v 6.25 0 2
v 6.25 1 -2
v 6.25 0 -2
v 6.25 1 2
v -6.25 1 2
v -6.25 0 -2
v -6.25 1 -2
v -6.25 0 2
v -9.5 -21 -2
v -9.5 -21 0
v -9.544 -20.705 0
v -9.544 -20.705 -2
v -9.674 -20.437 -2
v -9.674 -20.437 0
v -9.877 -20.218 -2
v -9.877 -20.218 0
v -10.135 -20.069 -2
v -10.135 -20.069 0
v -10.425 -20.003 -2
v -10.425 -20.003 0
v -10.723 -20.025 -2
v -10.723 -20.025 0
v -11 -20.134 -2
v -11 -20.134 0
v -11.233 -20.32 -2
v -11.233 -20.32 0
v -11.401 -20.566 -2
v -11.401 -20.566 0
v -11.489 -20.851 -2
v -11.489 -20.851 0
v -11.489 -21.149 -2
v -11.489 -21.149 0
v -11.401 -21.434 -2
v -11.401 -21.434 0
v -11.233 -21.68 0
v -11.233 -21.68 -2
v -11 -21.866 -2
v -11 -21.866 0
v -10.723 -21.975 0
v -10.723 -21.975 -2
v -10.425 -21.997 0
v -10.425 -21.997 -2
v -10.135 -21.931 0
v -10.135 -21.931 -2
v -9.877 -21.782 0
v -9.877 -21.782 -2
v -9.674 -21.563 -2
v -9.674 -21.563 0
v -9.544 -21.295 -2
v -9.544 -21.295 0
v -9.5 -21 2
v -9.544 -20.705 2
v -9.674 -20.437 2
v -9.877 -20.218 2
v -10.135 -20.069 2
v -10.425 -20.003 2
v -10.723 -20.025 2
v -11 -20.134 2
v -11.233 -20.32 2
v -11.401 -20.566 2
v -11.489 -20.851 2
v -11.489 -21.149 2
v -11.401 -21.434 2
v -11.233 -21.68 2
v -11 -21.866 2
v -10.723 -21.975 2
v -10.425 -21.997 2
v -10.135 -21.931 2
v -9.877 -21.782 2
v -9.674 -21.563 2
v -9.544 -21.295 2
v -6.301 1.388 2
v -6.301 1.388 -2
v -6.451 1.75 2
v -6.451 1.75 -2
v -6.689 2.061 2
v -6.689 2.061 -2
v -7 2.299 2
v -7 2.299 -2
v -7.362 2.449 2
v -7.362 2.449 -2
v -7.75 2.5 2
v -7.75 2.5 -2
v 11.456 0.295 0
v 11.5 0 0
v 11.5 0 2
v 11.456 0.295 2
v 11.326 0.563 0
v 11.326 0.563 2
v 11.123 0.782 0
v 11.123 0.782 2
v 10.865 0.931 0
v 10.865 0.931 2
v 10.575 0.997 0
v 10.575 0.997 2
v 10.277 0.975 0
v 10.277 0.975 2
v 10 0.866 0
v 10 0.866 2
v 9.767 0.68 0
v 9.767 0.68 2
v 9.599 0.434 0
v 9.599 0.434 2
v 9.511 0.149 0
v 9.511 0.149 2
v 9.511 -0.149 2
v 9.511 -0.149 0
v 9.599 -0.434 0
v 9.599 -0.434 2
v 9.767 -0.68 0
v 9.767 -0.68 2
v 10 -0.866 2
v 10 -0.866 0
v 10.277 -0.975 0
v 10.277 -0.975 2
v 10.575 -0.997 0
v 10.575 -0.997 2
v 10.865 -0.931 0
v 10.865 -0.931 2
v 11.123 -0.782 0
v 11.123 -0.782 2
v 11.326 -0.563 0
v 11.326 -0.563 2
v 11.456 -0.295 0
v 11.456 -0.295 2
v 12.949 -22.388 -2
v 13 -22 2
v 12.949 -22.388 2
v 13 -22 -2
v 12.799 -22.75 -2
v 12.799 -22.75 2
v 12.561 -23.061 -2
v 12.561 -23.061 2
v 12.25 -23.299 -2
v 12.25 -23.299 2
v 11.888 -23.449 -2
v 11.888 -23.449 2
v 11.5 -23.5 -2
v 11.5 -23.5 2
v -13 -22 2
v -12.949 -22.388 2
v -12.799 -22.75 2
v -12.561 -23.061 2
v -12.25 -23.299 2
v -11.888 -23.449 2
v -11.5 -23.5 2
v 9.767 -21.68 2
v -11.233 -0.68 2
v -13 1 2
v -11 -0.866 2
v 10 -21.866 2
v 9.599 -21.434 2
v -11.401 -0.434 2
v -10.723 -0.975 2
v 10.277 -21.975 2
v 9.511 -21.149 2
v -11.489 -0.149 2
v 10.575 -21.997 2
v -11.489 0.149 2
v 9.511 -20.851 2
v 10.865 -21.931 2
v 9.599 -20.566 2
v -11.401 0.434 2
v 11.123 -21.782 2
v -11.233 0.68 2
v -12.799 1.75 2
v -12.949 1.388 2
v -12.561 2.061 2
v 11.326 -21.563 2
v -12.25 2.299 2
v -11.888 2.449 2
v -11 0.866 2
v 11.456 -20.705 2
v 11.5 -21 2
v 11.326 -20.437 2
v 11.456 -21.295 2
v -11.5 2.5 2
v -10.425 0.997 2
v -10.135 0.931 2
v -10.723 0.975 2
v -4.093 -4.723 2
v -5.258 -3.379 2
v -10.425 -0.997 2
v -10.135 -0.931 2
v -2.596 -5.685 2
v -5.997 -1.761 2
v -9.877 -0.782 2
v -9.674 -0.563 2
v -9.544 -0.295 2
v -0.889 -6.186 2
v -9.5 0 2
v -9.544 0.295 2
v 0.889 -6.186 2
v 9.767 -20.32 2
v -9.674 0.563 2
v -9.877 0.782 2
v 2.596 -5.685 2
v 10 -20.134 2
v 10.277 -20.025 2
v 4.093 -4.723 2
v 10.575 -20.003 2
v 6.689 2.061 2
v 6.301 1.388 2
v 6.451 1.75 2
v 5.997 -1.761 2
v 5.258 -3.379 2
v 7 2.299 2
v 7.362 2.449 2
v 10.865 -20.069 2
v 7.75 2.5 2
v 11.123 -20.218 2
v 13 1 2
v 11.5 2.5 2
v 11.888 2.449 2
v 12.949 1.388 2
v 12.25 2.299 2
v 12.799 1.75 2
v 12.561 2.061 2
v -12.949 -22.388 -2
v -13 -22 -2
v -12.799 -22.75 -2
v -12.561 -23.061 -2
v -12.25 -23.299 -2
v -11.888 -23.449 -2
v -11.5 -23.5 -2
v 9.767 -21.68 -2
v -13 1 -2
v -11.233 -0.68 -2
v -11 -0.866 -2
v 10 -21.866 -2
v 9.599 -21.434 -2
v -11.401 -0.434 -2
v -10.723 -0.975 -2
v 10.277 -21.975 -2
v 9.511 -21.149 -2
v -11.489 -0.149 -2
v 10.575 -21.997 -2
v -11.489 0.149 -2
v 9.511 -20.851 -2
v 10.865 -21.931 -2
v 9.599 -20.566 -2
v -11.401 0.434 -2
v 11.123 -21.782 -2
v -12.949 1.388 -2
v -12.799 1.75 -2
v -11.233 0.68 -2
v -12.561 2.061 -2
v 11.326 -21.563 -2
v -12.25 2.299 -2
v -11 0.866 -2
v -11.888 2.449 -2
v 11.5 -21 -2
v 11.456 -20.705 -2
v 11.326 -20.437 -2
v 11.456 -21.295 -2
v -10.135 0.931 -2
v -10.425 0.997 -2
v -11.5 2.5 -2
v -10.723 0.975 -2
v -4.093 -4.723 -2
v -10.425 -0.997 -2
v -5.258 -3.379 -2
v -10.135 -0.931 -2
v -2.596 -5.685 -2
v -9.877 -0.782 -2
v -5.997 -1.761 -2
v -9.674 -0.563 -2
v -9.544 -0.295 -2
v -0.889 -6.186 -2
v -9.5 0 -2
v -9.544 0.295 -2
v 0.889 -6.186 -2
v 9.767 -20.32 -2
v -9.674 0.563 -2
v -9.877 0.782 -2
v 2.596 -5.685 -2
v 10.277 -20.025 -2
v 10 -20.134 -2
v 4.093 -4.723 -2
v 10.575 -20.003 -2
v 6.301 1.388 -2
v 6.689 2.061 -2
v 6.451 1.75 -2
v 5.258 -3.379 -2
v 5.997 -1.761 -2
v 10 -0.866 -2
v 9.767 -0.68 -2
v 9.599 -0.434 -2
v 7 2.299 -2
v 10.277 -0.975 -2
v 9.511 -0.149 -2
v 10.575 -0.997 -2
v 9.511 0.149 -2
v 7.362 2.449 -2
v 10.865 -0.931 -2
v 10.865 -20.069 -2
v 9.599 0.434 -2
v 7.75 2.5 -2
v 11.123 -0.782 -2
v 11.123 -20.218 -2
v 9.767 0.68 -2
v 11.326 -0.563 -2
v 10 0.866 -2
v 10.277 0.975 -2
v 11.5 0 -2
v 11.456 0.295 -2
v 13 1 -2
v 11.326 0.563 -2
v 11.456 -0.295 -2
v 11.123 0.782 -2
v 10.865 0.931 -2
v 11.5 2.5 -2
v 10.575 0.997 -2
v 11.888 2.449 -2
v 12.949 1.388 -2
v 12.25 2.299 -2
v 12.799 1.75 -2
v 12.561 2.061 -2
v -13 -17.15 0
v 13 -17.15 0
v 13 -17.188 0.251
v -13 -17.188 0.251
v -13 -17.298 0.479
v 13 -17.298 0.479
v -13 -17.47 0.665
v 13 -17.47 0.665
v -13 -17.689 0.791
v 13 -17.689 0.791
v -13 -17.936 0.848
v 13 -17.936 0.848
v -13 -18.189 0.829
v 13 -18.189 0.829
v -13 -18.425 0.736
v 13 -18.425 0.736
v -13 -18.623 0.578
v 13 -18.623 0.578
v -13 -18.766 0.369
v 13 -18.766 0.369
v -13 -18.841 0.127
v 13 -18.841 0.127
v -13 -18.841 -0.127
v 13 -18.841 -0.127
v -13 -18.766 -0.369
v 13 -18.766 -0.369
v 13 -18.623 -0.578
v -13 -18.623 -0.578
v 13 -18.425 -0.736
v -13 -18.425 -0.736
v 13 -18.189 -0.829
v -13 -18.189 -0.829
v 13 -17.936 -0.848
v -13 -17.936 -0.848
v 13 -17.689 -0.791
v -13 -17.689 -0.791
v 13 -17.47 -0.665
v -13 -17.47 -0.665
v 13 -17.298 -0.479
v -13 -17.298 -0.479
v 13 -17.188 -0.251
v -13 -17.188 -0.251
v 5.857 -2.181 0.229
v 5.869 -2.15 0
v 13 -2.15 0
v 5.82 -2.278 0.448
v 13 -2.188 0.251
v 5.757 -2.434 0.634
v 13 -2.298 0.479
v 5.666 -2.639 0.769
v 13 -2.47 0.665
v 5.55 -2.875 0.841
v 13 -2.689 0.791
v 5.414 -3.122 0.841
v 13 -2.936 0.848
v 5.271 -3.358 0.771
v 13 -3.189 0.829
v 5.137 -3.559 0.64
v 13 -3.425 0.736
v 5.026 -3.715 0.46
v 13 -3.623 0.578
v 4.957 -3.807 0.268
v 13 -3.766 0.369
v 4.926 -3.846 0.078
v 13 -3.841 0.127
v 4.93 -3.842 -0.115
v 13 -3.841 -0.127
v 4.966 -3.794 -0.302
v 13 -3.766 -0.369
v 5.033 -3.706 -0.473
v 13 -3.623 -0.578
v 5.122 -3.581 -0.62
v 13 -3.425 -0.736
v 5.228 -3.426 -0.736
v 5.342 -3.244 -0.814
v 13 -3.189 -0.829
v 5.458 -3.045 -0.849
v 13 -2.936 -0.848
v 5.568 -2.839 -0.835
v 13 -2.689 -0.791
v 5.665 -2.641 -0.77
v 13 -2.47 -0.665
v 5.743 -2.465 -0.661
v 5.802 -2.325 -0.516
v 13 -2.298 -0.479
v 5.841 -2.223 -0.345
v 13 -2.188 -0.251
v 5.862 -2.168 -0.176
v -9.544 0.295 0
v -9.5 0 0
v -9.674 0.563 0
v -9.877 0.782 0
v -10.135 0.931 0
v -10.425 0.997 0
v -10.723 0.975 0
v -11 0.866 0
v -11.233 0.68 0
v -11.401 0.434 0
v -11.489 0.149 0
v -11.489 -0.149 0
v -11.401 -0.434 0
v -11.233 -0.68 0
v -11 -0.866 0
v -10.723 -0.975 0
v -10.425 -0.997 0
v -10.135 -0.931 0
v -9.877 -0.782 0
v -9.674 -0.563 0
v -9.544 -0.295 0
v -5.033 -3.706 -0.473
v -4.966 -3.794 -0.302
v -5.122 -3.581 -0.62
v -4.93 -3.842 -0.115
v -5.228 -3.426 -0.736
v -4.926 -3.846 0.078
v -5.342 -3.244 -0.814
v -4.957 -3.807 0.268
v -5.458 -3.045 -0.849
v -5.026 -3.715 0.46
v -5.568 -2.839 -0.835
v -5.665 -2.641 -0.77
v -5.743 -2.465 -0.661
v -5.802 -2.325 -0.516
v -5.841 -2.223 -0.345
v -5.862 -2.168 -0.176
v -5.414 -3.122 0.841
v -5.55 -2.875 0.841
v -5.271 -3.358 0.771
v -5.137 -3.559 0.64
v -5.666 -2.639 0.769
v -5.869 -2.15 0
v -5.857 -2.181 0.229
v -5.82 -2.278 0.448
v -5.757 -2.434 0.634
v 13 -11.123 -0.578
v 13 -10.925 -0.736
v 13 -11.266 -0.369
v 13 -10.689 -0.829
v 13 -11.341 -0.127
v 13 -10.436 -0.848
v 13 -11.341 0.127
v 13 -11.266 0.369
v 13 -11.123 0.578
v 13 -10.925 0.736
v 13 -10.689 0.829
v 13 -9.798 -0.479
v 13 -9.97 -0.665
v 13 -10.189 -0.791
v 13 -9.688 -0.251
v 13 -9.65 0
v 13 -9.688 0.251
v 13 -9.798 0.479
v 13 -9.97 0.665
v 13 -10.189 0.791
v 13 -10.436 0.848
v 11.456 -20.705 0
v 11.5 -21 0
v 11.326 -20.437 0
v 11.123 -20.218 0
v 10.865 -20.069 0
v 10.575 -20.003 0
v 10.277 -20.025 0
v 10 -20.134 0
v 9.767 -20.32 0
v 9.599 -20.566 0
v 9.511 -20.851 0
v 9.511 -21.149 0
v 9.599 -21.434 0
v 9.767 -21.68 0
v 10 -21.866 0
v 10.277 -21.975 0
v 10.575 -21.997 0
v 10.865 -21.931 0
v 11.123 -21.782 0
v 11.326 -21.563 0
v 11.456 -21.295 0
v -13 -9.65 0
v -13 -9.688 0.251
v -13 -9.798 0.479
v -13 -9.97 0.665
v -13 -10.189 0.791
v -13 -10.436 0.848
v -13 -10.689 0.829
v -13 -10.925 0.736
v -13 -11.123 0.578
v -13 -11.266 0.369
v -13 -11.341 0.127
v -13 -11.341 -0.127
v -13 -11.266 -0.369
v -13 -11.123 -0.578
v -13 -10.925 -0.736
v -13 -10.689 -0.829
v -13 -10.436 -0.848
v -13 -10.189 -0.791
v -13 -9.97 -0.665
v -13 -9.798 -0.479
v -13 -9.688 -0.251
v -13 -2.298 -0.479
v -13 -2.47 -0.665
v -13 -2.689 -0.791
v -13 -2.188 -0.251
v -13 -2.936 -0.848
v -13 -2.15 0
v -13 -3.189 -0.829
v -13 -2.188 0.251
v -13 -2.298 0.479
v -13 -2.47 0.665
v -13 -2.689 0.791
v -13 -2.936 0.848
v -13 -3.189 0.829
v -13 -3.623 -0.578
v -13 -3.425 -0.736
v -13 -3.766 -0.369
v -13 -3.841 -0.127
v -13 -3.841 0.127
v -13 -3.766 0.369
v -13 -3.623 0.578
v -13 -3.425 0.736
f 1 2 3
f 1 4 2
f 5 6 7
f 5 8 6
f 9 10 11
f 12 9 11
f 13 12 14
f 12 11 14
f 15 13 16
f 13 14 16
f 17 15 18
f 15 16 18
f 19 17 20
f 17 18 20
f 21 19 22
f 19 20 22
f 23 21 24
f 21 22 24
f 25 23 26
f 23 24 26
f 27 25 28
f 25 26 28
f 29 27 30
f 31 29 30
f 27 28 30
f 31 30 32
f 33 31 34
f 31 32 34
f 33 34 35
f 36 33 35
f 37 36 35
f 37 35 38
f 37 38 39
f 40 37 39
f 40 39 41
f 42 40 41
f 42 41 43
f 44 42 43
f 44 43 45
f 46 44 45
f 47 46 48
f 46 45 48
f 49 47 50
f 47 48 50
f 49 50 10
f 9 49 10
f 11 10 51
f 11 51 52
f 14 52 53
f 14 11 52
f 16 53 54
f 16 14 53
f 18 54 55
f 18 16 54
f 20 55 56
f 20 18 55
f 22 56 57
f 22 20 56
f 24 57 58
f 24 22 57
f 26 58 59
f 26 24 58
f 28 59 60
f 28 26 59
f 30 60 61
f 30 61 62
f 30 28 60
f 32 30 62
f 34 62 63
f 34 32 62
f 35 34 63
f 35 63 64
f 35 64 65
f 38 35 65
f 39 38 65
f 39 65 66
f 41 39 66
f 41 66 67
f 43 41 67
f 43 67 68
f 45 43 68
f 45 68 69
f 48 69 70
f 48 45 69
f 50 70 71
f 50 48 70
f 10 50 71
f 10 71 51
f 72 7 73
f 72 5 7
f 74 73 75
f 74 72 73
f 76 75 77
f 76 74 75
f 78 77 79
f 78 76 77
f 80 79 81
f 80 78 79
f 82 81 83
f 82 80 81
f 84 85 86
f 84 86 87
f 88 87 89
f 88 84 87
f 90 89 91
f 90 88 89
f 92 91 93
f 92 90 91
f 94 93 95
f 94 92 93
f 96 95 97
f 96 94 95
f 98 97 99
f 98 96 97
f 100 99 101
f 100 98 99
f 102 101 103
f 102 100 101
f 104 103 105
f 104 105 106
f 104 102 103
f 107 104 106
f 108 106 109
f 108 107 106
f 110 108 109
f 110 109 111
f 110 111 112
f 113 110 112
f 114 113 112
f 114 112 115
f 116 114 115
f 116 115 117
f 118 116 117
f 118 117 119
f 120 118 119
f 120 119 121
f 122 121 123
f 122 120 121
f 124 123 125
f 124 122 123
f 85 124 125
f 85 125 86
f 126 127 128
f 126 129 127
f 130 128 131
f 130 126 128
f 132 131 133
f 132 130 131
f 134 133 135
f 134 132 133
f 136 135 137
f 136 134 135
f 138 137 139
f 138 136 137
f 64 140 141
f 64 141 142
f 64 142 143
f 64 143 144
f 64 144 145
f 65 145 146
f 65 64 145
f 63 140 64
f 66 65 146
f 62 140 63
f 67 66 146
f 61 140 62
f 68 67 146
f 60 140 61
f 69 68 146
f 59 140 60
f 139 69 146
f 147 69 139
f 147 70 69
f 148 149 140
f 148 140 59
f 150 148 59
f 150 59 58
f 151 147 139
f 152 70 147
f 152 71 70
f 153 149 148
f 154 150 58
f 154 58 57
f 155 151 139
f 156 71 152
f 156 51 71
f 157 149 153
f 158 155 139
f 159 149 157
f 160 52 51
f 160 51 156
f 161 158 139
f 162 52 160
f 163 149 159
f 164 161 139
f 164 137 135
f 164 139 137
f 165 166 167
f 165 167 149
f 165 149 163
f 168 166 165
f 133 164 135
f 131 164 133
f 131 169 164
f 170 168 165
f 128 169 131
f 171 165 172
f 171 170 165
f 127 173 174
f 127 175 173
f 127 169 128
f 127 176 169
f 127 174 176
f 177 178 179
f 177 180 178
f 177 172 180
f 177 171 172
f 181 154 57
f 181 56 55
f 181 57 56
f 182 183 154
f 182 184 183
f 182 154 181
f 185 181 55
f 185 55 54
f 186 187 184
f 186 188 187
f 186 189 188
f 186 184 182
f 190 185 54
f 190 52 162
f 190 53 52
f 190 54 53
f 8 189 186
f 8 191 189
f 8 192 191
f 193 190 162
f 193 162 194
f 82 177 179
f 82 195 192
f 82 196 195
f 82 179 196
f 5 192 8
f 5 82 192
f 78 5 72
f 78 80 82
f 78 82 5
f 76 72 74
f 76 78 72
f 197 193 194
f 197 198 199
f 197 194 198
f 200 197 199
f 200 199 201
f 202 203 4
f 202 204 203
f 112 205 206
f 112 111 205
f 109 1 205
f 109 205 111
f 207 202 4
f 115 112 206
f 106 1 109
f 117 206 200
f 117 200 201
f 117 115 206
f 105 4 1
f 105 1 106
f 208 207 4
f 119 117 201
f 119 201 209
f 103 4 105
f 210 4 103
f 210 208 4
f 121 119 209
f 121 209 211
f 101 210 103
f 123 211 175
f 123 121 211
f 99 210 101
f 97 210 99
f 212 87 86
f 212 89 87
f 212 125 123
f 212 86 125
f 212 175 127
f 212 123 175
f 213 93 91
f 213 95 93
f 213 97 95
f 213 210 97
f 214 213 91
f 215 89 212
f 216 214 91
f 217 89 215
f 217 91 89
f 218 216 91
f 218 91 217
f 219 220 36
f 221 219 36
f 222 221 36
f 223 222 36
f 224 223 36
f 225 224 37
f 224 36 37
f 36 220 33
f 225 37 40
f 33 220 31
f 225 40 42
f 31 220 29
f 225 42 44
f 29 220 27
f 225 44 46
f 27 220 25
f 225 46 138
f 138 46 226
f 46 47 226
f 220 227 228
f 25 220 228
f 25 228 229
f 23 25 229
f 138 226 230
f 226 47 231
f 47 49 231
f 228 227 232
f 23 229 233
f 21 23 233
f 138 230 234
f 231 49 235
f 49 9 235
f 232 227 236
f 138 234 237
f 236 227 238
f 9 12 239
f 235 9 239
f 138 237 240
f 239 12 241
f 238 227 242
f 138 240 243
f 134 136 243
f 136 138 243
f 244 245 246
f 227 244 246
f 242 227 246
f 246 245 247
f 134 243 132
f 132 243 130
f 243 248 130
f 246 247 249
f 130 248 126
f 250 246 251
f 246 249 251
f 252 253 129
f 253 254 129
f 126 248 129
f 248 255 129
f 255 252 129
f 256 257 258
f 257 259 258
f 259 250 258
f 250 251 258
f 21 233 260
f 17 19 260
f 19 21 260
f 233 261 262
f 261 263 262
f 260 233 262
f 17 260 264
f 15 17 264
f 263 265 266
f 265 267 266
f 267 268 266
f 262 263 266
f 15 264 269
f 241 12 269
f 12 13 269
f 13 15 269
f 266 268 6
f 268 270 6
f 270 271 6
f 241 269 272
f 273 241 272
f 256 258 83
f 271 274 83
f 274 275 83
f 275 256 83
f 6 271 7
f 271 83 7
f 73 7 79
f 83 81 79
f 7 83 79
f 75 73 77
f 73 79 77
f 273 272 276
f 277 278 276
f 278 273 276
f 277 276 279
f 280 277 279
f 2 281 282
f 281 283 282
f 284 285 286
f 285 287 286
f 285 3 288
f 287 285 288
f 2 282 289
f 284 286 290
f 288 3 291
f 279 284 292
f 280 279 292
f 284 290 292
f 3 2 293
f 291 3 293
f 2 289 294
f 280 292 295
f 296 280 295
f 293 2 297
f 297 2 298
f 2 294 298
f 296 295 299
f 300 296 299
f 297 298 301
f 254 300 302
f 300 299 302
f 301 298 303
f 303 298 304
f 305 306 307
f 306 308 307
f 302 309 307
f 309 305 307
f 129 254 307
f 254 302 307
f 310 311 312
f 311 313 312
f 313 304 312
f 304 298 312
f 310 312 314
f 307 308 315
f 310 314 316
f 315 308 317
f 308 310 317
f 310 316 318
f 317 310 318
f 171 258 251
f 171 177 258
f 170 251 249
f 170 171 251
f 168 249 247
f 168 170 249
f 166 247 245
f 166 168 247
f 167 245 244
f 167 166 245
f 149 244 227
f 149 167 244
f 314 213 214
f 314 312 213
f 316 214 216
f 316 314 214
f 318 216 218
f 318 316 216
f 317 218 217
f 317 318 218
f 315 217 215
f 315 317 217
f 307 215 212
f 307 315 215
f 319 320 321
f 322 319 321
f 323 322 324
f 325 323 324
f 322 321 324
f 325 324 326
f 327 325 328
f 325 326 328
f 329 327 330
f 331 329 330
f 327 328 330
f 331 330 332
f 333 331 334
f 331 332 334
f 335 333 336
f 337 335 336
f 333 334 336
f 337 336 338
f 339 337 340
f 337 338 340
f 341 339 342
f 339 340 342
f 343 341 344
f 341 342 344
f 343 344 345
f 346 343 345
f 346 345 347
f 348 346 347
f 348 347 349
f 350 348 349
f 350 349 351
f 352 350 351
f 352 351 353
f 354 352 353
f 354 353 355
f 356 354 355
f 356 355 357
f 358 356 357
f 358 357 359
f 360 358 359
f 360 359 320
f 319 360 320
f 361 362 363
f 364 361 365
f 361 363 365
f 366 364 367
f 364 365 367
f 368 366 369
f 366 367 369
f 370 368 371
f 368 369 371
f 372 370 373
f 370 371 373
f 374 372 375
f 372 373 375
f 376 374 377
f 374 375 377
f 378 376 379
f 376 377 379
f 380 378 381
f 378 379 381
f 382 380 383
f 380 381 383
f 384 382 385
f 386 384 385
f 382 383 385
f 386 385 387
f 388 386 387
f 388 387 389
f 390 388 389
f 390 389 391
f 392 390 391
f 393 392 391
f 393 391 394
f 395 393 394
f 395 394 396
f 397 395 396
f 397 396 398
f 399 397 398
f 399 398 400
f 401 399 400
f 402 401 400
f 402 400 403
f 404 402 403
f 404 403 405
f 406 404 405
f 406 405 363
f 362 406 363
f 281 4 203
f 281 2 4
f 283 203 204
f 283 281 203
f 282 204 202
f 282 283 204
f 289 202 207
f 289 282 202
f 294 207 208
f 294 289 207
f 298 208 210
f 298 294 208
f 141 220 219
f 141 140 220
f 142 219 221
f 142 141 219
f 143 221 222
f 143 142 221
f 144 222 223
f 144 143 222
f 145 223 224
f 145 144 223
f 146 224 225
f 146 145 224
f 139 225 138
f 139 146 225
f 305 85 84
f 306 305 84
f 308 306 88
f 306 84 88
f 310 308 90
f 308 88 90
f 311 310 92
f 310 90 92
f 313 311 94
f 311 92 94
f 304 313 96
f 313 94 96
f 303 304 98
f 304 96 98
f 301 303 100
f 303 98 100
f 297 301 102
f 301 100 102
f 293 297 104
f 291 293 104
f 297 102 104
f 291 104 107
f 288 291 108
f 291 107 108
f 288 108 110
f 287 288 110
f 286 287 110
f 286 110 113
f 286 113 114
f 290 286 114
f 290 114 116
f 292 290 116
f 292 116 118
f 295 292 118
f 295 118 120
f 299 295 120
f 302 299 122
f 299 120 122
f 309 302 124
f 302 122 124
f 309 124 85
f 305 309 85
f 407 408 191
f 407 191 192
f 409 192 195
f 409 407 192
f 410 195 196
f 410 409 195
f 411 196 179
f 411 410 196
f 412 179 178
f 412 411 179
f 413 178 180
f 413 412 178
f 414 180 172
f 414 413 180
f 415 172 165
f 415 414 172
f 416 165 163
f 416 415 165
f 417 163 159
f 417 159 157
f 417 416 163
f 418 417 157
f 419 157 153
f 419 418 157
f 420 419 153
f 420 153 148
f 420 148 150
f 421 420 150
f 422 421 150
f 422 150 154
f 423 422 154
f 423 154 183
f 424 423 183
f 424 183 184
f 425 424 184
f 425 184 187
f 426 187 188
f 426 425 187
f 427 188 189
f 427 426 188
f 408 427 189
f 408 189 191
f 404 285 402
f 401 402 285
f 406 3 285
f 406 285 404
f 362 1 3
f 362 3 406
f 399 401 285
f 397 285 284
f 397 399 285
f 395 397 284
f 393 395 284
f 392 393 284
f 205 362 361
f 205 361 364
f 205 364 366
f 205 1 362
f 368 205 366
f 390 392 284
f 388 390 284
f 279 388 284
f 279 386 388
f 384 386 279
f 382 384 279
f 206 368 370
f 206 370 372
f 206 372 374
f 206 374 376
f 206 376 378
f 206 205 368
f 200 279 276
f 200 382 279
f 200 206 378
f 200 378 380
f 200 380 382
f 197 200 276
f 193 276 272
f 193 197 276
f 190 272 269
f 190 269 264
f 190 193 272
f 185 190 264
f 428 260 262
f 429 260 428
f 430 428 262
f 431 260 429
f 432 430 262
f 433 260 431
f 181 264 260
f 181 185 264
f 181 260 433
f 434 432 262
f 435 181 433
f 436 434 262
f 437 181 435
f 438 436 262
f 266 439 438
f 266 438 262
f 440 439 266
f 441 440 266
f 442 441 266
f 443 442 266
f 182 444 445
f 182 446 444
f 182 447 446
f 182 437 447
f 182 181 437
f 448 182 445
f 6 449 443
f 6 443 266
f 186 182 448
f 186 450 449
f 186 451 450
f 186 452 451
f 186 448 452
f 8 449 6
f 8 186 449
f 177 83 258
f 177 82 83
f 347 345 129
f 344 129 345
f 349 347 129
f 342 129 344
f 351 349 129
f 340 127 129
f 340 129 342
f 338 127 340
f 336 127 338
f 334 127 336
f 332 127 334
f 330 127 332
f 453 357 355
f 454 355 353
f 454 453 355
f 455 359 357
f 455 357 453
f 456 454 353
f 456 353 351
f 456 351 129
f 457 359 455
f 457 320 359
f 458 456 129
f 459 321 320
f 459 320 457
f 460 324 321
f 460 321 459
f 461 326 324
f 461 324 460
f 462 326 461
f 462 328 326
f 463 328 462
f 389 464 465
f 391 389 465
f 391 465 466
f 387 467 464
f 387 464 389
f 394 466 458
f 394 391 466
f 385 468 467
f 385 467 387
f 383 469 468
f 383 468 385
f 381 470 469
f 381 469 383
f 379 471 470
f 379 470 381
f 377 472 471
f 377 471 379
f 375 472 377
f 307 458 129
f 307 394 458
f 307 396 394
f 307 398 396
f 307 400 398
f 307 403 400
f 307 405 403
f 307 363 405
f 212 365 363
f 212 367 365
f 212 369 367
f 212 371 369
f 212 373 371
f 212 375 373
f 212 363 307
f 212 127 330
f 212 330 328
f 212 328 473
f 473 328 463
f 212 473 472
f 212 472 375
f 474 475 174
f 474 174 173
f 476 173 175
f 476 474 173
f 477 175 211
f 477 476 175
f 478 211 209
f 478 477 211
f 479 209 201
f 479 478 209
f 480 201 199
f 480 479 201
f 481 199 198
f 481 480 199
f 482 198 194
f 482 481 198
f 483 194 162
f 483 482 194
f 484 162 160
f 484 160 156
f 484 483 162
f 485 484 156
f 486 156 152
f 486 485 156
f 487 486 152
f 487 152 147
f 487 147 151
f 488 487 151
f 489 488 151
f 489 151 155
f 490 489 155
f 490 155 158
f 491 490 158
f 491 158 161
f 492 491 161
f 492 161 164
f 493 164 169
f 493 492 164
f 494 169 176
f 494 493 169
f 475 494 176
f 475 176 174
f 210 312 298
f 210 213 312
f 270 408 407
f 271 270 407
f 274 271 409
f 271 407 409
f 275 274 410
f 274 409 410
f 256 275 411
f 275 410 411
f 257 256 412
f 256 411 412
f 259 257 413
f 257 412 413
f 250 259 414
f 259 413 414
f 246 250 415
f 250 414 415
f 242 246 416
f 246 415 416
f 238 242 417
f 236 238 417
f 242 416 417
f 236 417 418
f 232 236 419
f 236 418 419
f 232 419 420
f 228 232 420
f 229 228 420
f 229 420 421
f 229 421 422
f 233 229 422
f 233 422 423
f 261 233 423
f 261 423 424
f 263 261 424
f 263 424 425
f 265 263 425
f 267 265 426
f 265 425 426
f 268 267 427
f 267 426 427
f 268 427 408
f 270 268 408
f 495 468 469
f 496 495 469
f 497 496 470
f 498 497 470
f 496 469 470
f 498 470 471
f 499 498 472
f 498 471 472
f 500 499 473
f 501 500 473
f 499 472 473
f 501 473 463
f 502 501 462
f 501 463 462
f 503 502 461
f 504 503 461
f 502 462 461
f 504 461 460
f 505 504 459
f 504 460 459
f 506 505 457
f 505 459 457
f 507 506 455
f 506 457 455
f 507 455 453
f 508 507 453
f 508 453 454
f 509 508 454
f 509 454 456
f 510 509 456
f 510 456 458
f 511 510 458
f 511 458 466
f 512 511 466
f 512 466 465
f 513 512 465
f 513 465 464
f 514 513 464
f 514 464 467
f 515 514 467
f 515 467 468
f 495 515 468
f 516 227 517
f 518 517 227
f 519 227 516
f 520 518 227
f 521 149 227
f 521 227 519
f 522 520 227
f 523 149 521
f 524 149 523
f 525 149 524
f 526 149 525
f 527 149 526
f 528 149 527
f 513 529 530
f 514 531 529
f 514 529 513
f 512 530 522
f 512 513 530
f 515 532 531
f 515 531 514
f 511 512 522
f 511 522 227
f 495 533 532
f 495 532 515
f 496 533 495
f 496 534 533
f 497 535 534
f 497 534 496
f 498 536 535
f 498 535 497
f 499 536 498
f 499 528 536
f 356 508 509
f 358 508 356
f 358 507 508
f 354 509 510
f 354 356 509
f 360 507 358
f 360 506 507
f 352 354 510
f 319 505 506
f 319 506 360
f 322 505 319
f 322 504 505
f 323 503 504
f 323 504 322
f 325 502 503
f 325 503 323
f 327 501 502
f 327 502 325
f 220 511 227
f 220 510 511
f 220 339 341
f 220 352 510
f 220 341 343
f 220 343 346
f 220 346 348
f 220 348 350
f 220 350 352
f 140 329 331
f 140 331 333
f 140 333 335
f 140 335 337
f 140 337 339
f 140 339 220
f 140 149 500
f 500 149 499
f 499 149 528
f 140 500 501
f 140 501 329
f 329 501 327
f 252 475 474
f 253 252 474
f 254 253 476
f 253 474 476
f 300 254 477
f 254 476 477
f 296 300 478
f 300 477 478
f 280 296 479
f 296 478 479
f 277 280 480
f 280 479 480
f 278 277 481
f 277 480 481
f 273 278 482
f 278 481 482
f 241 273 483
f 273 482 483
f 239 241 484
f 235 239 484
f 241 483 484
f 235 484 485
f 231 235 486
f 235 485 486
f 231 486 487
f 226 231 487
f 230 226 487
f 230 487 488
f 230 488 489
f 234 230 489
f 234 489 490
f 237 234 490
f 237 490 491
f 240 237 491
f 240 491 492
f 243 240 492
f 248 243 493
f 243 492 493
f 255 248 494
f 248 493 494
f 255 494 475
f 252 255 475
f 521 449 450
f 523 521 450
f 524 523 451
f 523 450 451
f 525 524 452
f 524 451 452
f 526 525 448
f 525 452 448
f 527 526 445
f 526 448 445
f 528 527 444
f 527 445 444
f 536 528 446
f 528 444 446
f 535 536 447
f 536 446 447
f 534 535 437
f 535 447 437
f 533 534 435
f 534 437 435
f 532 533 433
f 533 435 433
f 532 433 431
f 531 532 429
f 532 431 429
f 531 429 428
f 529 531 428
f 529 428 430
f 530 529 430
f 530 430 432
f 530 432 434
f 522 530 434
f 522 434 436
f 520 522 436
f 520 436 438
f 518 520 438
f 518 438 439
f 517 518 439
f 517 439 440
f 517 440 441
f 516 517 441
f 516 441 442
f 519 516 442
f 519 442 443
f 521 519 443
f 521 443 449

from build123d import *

# Parameters (mm, degrees)
F0_R          = 1
F1_DEPTH      = 2
F1_DEPTH_BACK = 2
F3_R          = 0.85
F4_DEPTH      = 26.001
F5_R          = 1.5


with BuildPart() as f1:
    # F0 (on Top) → F1 (new body, two sides)
    with BuildSketch(Plane.XY) as f1_sk:
        with BuildLine():
            ThreePointArc((6.25, 0), (0, -6.25), (-6.25, 0))
            Line((-6.25, 0), (-6.25, 2.5))
            Line((-6.25, 2.5), (-13, 2.5))
            Line((-13, 2.5), (-13, -23.5))
            Line((-13, -23.5), (13, -23.5))
            Line((13, -23.5), (13, 2.5))
            Line((13, 2.5), (6.25, 2.5))
            Line((6.25, 2.5), (6.25, 0))
        make_face()
        with Locations((-10.5, -21)):
            Circle(F0_R, mode=Mode.SUBTRACT)
        with Locations((10.5, -21)):
            Circle(F0_R, mode=Mode.SUBTRACT)
        with Locations((-10.5, 0)):
            Circle(F0_R, mode=Mode.SUBTRACT)
        with Locations((10.5, 0)):
            Circle(F0_R, mode=Mode.SUBTRACT)
    extrude(amount=F1_DEPTH)
    extrude(f1_sk.sketch, amount=-F1_DEPTH_BACK)

    # F3 (on face) → F4 (cut, through all)
    with BuildSketch(Plane.YZ.offset(13)):
        with Locations((-10.5, 0)):
            Circle(F3_R)
        with Locations((-3, 0)):
            Circle(F3_R)
        with Locations((-18, 0)):
            Circle(F3_R)
    extrude(amount=-F4_DEPTH, mode=Mode.SUBTRACT)

    # F5
    f5_edges = [f1.edges().sort_by_distance(p)[0] for p in [
        (-13, 2.5, 0),
        (13, 2.5, 0),
        (6.25, 2.5, 0),
        (-6.25, 2.5, 0),
        (-13, -23.5, 0),
        (13, -23.5, 0),
    ]]
    fillet(f5_edges, radius=F5_R)


solid = f1.part
